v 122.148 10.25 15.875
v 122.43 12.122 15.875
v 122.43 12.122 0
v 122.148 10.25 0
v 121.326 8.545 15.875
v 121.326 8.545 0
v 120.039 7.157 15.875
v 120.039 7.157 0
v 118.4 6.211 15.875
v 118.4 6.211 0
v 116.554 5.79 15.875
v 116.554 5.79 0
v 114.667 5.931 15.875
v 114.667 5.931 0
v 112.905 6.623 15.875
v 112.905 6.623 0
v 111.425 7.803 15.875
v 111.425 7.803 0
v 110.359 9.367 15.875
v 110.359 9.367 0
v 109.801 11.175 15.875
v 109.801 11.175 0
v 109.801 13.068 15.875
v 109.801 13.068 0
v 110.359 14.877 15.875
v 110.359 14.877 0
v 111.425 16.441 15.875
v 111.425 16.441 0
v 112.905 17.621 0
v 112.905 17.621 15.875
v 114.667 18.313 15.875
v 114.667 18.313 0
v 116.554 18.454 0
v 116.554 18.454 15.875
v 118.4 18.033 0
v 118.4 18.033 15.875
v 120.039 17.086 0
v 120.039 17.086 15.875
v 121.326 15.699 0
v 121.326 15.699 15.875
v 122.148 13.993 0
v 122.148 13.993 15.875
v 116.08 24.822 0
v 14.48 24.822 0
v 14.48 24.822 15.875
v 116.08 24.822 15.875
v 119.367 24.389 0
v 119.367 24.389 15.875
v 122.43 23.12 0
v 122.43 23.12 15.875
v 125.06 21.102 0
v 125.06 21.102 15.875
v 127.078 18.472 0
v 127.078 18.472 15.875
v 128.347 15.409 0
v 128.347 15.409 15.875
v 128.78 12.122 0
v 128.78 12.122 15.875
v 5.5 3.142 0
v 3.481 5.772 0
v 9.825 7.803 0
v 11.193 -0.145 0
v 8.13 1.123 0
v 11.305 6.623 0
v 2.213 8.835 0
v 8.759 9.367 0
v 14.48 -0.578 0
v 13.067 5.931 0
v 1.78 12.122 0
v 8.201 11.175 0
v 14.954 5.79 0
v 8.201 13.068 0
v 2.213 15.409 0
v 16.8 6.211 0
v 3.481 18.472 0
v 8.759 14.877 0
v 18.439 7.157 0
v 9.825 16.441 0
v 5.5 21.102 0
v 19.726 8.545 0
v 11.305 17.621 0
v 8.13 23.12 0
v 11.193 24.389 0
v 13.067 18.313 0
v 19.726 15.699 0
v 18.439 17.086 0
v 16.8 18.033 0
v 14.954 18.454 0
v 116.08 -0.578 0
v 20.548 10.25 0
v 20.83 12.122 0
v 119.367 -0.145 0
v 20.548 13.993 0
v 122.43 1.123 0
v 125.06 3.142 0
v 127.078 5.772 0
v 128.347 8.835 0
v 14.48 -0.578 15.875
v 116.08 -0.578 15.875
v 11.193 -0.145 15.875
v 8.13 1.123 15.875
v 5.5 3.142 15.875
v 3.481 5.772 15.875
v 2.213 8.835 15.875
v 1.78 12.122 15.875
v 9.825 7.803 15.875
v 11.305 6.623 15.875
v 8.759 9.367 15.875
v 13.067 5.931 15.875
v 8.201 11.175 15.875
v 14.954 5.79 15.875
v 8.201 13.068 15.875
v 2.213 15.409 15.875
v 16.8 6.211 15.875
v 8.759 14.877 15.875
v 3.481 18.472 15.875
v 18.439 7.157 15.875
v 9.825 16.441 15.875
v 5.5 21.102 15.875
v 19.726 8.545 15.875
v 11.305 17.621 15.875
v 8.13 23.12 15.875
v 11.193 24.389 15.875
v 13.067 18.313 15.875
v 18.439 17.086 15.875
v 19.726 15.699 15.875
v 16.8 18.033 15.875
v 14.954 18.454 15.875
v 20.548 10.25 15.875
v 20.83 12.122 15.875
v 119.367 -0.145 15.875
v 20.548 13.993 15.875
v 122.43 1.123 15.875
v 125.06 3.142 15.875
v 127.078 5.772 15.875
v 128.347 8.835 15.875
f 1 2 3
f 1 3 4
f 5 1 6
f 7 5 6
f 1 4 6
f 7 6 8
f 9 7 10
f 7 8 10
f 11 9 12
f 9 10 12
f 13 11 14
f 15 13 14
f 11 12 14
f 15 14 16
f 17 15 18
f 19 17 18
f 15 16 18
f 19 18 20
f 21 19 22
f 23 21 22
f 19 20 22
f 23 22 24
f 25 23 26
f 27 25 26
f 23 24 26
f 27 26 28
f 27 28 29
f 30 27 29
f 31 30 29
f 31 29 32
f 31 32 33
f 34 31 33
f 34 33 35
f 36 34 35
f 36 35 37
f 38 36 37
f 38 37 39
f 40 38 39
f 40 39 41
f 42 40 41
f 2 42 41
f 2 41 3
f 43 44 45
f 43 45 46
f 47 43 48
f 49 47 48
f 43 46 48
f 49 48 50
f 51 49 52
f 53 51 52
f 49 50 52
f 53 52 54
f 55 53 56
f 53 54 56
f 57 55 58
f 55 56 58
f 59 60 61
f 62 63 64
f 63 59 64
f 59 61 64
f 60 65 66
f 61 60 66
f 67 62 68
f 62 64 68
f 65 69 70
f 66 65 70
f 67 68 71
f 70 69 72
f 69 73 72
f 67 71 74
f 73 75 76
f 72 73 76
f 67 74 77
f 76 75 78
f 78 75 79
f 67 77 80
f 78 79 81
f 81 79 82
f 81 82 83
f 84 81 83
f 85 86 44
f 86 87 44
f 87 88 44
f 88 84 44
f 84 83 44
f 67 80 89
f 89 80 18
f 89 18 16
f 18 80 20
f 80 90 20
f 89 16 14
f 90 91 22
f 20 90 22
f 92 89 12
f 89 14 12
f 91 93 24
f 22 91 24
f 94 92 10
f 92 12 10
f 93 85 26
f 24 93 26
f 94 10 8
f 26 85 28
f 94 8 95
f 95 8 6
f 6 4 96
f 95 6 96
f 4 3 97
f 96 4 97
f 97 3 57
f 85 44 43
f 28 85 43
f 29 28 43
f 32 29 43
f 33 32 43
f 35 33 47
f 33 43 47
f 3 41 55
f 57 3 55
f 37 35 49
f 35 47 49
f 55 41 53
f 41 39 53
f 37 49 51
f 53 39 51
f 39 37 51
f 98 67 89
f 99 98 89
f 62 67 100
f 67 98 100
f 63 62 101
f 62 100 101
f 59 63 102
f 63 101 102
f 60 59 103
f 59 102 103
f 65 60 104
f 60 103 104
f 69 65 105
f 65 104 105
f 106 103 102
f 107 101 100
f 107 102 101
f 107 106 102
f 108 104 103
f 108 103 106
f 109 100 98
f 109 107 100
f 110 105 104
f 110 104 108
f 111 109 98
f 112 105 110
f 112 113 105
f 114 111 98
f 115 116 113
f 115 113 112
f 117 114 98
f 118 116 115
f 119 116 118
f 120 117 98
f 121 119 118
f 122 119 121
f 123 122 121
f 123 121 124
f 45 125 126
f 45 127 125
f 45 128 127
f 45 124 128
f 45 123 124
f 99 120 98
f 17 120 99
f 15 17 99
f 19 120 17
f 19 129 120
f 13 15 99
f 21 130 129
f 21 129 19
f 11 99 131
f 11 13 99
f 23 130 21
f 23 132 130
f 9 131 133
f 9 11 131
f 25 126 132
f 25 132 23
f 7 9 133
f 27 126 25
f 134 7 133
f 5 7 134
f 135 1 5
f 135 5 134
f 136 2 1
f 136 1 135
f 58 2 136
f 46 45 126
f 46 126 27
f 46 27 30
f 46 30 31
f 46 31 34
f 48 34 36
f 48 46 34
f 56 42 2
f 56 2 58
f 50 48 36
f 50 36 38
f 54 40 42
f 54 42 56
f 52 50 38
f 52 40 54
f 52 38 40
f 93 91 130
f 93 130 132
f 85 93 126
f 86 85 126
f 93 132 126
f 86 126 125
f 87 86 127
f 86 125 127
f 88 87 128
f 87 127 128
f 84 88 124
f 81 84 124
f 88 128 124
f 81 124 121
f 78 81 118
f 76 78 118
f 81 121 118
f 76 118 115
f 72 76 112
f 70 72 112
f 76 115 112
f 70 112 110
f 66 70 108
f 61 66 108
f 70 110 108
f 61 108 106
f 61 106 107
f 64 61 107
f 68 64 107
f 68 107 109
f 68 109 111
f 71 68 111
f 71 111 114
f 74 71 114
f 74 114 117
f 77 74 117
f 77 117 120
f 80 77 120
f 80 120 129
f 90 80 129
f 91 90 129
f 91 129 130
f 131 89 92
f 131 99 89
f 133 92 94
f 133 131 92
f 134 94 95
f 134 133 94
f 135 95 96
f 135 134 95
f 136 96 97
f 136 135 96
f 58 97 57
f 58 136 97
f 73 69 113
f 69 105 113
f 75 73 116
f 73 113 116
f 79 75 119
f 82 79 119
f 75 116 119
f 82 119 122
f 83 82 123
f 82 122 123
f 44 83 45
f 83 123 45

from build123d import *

# Parameters (mm, degrees)
F0_W     = 127
F0_H     = 25.4
F1_DEPTH = 15.875
F2_R     = 6.35
F3_DEPTH = 15.876
F4_R     = 12.69999
F5_R     = 6.35
F6_DEPTH = 15.876
F7_R     = 12.69999


# Not quite as in the source:
# - a fillet or chamfer is up to 0.001 mm smaller than in the source, because OpenCascade refuses the exact size


with BuildPart() as f1:
    # F0 (on Top) → F1 (new body)
    with BuildSketch(Plane.XY):
        with Locations((65.2798527717, 12.1217946971)):
            Rectangle(F0_W, F0_H)
    extrude(amount=F1_DEPTH)

    # F2 (on face) → F3 (cut, through all)
    with BuildSketch(Plane(origin=(0, 0, 0), x_dir=(1, 0, 0), z_dir=(0, 0, -1))):
        with Locations((116.0798527717, -12.1217946971)):
            Circle(F2_R)
    extrude(amount=-F3_DEPTH, mode=Mode.SUBTRACT)

    # F4 (radius 12.7 in the source; OpenCascade refuses exactly that, so slightly less here)
    f4_edges = [f1.edges().sort_by_distance(p)[0] for p in [
        (128.779853, 24.821795, 7.9375),
        (128.779853, -0.578205, 7.9375),
    ]]
    fillet(f4_edges, radius=F4_R)

    # F5 (on face) → F6 (cut, through all)
    with BuildSketch(Plane.XY.offset(15.875)):
        with Locations((14.4798527717, 12.1217946971)):
            Circle(F5_R)
    extrude(amount=-F6_DEPTH, mode=Mode.SUBTRACT)

    # F7 (radius 12.7 in the source; OpenCascade refuses exactly that, so slightly less here)
    f7_edges = [f1.edges().sort_by_distance(p)[0] for p in [
        (1.779853, 24.821795, 7.9375),
        (1.779853, -0.578205, 7.9375),
    ]]
    fillet(f7_edges, radius=F7_R)


solid = f1.part
